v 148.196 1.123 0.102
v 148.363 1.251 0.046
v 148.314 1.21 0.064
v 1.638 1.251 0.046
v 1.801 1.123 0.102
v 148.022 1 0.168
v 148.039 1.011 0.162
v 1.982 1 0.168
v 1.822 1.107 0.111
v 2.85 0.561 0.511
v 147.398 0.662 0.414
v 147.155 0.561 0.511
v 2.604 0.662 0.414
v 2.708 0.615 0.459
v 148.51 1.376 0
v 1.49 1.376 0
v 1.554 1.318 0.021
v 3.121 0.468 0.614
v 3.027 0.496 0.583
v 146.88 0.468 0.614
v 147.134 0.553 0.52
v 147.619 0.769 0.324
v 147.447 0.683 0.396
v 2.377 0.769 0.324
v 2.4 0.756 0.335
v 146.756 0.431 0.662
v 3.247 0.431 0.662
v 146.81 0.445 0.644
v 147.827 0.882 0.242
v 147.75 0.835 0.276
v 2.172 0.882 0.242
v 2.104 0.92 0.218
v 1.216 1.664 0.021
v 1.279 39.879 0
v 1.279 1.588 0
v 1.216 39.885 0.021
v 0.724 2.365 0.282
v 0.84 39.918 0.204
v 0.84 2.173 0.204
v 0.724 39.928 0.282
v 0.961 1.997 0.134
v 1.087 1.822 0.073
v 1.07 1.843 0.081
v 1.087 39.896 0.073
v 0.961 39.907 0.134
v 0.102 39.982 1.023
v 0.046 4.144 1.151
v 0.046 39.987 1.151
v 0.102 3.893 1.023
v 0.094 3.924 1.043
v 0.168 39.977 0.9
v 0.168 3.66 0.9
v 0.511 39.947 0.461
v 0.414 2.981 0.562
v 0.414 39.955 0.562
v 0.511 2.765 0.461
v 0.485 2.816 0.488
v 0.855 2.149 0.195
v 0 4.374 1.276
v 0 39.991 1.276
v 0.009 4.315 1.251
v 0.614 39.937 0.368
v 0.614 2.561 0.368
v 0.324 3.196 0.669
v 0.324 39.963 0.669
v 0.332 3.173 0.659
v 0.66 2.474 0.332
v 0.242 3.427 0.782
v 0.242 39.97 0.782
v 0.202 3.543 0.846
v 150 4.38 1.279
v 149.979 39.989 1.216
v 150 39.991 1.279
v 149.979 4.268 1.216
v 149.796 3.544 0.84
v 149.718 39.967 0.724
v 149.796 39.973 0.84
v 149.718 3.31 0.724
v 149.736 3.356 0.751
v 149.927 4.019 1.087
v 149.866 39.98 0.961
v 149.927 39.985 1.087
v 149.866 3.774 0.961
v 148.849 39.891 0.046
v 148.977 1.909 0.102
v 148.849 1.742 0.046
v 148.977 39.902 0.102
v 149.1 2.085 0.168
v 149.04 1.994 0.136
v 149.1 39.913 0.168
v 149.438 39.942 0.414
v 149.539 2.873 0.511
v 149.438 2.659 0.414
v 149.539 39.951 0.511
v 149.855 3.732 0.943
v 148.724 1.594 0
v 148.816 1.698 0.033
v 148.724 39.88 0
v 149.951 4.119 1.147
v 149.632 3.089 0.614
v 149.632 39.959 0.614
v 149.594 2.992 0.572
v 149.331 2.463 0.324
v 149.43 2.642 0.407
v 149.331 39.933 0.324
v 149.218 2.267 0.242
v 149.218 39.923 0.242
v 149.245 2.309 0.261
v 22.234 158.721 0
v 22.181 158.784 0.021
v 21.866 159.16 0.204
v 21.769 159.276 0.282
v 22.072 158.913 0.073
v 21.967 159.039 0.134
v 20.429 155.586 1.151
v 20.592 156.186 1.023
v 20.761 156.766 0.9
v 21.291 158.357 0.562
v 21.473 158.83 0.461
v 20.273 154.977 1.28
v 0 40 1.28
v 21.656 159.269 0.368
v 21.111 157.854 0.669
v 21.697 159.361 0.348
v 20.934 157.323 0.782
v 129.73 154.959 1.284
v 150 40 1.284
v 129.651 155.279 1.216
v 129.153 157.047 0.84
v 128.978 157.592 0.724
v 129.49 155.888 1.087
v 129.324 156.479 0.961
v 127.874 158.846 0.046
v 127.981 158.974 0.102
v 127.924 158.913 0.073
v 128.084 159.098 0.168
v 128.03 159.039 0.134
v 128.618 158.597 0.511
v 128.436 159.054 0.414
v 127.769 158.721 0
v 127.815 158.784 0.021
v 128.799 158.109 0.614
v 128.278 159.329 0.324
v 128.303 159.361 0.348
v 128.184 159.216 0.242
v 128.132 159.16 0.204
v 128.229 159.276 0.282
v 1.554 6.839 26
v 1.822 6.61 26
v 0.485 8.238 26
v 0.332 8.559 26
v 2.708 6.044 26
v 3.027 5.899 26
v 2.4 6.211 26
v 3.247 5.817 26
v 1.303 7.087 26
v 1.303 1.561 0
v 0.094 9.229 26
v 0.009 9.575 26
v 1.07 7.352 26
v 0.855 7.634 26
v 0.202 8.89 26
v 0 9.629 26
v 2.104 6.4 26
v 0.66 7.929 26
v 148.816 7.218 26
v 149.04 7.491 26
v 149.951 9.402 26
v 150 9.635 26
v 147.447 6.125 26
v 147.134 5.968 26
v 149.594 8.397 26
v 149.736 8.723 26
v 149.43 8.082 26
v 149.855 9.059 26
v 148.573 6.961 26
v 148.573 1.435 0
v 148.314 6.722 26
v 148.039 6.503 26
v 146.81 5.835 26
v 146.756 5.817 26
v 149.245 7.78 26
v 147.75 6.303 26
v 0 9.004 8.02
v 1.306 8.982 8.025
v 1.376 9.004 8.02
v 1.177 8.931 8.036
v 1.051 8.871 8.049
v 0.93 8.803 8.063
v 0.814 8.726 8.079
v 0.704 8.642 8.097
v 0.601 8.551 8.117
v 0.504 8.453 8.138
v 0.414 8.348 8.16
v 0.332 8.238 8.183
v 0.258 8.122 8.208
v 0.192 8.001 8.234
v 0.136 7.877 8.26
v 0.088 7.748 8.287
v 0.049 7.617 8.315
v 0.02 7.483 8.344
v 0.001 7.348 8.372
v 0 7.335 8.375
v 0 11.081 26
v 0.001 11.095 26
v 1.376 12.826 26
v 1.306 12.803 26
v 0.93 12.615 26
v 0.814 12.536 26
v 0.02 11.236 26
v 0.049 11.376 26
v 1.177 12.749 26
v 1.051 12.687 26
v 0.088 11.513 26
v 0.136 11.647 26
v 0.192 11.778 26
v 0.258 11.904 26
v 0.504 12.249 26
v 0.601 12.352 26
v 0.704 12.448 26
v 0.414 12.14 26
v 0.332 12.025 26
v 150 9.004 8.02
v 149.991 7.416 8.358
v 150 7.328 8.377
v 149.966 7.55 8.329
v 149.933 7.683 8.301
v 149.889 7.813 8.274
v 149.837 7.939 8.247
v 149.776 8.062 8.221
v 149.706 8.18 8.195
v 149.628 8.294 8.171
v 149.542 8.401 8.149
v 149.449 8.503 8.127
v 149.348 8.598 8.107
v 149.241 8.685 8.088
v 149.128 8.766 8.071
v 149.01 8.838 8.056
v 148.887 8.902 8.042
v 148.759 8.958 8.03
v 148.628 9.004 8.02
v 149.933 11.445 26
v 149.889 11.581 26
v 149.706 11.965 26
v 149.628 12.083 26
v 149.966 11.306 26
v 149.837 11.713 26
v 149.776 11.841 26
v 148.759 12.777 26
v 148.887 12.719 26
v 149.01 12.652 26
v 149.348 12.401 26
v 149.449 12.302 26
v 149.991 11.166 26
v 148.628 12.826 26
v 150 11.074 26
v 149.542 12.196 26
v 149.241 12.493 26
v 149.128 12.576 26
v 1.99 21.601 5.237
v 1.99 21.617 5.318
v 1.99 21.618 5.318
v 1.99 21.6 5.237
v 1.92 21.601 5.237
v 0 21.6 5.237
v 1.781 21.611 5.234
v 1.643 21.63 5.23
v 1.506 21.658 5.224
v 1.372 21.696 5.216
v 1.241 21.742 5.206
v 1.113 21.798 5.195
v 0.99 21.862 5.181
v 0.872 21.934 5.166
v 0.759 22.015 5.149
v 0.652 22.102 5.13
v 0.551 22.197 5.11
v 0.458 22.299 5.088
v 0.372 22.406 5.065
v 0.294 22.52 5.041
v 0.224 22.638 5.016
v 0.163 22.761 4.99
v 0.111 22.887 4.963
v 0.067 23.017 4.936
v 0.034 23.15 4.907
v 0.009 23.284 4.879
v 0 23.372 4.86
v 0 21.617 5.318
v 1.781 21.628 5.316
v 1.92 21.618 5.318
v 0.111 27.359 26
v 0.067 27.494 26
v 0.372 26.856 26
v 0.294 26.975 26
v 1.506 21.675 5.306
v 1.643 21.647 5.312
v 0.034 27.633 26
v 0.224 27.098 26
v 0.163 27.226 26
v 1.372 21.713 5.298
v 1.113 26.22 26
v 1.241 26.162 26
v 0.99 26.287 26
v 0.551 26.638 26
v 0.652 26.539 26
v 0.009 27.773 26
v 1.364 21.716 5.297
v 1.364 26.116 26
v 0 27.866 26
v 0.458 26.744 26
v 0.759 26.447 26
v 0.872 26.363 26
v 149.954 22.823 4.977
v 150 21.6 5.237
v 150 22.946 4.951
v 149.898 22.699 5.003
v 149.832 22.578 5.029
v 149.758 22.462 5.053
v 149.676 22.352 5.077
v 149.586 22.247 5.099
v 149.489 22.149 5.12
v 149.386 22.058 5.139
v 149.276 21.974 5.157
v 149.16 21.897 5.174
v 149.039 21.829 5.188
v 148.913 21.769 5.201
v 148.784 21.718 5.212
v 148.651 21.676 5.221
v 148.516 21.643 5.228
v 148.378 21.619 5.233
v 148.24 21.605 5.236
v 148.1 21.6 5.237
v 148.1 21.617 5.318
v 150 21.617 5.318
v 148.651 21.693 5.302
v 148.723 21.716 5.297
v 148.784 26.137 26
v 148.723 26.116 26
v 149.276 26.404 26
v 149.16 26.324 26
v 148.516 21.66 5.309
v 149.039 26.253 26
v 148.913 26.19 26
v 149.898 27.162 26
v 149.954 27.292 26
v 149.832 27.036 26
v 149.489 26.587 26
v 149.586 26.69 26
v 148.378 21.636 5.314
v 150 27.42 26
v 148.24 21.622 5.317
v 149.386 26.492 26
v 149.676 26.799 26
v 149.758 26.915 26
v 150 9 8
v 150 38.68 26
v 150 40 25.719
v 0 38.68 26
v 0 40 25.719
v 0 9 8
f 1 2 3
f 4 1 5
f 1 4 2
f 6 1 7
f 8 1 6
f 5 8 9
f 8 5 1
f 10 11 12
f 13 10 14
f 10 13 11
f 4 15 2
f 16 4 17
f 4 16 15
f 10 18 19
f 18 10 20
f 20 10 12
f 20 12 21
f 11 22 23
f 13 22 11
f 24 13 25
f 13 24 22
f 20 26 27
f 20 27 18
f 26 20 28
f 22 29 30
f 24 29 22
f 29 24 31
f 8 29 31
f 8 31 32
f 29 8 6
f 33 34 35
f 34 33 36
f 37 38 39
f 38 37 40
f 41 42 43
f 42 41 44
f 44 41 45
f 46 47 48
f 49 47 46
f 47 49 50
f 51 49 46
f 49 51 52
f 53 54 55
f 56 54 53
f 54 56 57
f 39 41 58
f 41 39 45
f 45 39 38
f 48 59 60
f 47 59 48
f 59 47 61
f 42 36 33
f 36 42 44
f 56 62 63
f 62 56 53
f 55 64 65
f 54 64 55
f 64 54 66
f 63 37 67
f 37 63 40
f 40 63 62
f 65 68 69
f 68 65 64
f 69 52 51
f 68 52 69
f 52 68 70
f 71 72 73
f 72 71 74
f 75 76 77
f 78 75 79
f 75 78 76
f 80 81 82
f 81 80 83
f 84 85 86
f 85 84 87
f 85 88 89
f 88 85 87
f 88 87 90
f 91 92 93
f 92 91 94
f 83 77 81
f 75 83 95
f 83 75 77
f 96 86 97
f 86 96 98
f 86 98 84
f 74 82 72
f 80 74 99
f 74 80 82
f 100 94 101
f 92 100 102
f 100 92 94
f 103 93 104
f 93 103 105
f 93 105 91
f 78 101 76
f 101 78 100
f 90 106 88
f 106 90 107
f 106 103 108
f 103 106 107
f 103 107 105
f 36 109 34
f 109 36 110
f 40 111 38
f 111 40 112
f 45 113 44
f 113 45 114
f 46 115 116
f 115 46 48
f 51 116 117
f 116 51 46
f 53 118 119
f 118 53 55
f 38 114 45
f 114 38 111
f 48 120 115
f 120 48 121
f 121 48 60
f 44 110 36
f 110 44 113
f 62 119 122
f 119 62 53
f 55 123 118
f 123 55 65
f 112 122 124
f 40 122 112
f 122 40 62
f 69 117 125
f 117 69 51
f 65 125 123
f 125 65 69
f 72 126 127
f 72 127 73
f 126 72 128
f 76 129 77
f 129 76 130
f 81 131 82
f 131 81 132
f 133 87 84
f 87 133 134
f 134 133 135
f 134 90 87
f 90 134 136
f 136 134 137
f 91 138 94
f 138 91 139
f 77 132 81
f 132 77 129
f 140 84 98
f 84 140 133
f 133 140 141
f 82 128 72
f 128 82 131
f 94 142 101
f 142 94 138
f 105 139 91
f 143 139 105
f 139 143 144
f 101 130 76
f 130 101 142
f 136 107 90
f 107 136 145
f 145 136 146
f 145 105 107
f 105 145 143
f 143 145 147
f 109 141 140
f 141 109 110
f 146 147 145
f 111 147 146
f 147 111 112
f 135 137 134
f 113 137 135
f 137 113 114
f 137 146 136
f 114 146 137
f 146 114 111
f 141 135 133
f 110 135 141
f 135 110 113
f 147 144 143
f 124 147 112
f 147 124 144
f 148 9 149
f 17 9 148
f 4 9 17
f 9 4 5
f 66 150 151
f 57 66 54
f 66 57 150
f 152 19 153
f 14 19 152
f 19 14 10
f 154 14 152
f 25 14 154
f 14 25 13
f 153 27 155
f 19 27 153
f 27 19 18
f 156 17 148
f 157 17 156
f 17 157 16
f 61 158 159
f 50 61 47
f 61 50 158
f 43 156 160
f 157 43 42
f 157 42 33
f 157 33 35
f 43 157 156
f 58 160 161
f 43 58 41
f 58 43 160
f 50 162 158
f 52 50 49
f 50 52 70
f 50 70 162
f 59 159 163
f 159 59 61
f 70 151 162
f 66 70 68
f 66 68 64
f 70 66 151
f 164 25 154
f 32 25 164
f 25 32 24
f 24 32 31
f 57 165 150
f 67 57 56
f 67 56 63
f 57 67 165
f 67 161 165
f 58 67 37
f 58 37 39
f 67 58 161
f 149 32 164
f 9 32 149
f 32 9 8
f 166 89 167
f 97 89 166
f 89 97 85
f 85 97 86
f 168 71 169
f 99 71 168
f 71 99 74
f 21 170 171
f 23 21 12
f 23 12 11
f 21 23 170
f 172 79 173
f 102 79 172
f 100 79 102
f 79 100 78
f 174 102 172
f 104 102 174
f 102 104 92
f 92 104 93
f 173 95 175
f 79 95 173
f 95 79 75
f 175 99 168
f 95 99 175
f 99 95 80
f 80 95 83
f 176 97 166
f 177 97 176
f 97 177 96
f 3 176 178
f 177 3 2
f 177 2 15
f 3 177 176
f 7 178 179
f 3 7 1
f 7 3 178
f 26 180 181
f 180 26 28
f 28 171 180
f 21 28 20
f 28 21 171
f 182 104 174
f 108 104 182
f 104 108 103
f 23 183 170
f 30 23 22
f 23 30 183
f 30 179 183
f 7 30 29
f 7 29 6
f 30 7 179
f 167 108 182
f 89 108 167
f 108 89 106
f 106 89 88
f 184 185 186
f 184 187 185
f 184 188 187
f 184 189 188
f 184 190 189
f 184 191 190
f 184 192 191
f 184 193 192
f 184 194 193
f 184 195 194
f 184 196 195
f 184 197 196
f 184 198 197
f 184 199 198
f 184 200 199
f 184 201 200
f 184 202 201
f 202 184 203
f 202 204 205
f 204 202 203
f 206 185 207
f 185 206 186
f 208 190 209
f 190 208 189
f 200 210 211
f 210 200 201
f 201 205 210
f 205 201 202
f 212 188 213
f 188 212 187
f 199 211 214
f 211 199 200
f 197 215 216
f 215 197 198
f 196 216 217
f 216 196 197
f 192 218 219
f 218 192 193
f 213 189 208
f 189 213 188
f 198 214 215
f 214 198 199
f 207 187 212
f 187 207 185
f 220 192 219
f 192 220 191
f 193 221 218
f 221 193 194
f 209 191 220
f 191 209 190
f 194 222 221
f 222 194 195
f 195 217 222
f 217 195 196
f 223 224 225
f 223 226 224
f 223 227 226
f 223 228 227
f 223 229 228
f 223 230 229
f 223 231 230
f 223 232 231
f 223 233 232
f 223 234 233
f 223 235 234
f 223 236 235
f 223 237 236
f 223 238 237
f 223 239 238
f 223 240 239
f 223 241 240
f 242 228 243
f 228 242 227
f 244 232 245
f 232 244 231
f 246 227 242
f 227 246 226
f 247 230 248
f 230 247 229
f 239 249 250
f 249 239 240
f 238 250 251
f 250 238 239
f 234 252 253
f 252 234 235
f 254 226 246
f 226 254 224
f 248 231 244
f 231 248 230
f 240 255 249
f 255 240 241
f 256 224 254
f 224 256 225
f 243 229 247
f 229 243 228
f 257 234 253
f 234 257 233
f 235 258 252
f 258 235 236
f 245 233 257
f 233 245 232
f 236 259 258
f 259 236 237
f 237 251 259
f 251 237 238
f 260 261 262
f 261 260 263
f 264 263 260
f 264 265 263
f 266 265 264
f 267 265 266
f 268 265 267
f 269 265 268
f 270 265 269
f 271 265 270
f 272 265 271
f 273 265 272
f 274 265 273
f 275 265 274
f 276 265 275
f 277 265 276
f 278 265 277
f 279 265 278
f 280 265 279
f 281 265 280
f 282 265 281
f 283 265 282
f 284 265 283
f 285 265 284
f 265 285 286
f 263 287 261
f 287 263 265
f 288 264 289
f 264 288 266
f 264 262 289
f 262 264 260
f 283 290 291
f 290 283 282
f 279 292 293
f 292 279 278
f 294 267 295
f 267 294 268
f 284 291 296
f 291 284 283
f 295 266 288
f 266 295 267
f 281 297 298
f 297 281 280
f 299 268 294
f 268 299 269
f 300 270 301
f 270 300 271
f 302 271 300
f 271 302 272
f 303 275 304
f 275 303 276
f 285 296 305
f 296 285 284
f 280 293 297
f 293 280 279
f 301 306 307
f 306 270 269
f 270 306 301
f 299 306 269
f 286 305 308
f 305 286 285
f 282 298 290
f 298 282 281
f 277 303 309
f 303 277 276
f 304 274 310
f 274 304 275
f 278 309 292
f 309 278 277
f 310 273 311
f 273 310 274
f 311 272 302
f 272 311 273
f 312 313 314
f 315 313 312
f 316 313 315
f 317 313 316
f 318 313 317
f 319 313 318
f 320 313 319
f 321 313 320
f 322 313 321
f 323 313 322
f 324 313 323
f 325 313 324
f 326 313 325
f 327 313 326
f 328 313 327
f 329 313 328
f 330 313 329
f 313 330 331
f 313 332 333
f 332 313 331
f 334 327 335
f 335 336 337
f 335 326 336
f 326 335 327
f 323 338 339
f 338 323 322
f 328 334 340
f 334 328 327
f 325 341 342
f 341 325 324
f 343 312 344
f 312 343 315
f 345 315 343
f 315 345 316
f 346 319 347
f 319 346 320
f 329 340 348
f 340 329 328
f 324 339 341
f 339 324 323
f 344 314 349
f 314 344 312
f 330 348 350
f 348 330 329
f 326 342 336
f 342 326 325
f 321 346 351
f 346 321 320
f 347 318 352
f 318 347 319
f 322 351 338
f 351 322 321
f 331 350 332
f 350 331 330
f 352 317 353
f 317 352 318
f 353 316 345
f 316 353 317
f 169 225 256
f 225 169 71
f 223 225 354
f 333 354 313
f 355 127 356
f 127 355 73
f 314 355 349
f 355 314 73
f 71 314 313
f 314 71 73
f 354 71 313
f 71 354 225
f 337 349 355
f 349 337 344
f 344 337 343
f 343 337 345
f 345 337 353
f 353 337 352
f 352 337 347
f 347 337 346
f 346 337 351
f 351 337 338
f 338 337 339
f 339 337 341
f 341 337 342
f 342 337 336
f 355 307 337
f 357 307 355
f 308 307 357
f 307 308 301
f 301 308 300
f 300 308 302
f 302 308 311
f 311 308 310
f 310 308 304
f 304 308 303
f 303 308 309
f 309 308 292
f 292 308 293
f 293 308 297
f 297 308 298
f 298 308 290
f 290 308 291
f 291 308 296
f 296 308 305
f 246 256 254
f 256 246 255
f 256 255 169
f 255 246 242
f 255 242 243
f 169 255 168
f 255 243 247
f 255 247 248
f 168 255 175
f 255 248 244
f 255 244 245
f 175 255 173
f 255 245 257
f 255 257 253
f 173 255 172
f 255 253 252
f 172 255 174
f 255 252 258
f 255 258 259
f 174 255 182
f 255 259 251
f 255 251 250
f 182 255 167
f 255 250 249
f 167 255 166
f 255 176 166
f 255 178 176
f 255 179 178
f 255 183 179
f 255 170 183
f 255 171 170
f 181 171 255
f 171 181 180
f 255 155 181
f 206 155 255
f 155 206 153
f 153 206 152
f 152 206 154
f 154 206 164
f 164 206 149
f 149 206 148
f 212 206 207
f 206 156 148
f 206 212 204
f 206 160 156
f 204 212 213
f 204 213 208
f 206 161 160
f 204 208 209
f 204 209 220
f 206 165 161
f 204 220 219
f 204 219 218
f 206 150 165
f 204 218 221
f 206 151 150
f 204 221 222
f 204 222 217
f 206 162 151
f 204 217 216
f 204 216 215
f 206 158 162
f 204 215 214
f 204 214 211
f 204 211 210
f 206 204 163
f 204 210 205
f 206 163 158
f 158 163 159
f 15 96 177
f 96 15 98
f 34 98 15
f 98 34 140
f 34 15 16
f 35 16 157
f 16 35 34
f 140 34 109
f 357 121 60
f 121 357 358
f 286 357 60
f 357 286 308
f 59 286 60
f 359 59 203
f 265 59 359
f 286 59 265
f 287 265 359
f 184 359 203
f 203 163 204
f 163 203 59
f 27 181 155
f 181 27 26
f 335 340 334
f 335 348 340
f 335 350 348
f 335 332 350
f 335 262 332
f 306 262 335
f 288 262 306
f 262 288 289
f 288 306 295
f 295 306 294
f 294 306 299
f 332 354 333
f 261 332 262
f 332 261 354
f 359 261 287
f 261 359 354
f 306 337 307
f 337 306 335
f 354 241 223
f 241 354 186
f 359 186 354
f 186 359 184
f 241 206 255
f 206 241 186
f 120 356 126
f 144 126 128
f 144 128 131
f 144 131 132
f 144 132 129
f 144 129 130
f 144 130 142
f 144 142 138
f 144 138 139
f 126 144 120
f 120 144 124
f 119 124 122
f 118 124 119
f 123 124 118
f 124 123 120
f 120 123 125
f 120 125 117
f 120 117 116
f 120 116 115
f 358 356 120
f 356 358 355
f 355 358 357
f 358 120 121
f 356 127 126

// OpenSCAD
Base_Width = 150;
Base_Depth = 160;
Height = 26;
Angle = 12; // Degrees
Lip_Thickness = 9;
Slot_Width = 13;
Slot_Rise = 8;
Back_Bevel = -12;  // Degrees

echo(Angle);

module fillet(r,h){
    difference(){
        cube([r, r, h]);
        translate([r,r,-.1])cylinder(r=r, h=h+.1, $fn=90);
    }
}


difference(){
    cube([Base_Width, Base_Depth, Height]);
    // Bevel the front edge
    translate([-1,Slot_Width*(-1),0])rotate([Angle*(-1),0,0])cube([Base_Width+2,Slot_Width,Height+10]);
    // Remove the tablet slot
    translate([-1,Lip_Thickness,Slot_Rise])rotate([Angle*(-1),0,0])cube([Base_Width+2,Slot_Width,Height]);
    // Taper the back half
    //#translate([0,Base_Depth/4,Height])rotate([Back_Bevel,0,0])cube([Base_Width, Base_Depth, Height*2]);
    translate([Base_Width,Base_Depth+1,0])rotate([Back_Bevel,0,0])rotate([0,0,180])cube([Base_Width, Base_Depth, Height*2]);
    // Taper the left side
    translate([0,Base_Depth/4,-1])rotate([0,0,80])cube([Base_Depth, Base_Depth/2, Height+2]);
    // Taper the right side
    translate([Base_Width,Base_Depth/4,-01])rotate([0,0,10])cube([Base_Depth/2, Base_Depth, Height+2]);
    // Round front bottom
    translate([-1,0,-.1])rotate([90,0,90])fillet(r=2,h=Base_Width+2);
    // Round left straight
    translate([-.1,0,-.1])rotate([0,-90,-90])fillet(r=2,h=Base_Depth+2);
    // Round right straight
    translate([Base_Width+.1,0,-.1])rotate([90,0,180])fillet(r=2,h=Base_Depth+.2);
    // Round left side bottom
    translate([-.1,Base_Depth/4,-.1])rotate([-10,-90,-90])fillet(r=2,h=Base_Width);
    // Round right side bottom
    translate([Base_Width+.1,Base_Depth/4,-.1])rotate([-90,180,10])fillet(r=2,h=Base_Width);
    // Round back bottom
    translate([.1,Base_Depth+.1,-.1])rotate([0,-90,180])fillet(r=2,h=Base_Width);
    // Round front left
    translate([-.1,0,0,])rotate([Angle*(-1),0,0])fillet(r=5, h=Height+2);
    // Round front right
    translate([Base_Width+.1,0,0])rotate([Angle*(-1),0,0])rotate([0,0,90])fillet(r=5, h=Height+2);
    // Round slot front left
    translate([-.01,Lip_Thickness+.1,Slot_Rise])rotate([Angle*(-1),0,0])rotate([0,0,-90])fillet(r=2, h=Height+1);
    // Round slot front right
    translate([Base_Width+.01,Lip_Thickness+.1,Slot_Rise])rotate([Angle*(-1),0,0])rotate([0,0,180])fillet(r=2, h=Height+1);
    // Round slot back left
    translate([-.01,Lip_Thickness+Slot_Width-.4,Slot_Rise-(tan(Angle)*Slot_Width)])rotate([Angle*(-1),0,0])fillet(r=2, h=Height+1);
    // Round slot back right
    translate([Base_Width+.1,Lip_Thickness+Slot_Width-.4,Slot_Rise-(tan(Angle)*Slot_Width)])rotate([Angle*(-1),0,0])rotate([0,0,90])fillet(r=2, h=Height+1);
}
//translate([-.01,Lip_Thickness+Slot_Width-(),Slot_Rise-(tan(Angle)*Slot_Width)])rotate([Angle*(-1),0,0])fillet(r=2, h=Height+1);
